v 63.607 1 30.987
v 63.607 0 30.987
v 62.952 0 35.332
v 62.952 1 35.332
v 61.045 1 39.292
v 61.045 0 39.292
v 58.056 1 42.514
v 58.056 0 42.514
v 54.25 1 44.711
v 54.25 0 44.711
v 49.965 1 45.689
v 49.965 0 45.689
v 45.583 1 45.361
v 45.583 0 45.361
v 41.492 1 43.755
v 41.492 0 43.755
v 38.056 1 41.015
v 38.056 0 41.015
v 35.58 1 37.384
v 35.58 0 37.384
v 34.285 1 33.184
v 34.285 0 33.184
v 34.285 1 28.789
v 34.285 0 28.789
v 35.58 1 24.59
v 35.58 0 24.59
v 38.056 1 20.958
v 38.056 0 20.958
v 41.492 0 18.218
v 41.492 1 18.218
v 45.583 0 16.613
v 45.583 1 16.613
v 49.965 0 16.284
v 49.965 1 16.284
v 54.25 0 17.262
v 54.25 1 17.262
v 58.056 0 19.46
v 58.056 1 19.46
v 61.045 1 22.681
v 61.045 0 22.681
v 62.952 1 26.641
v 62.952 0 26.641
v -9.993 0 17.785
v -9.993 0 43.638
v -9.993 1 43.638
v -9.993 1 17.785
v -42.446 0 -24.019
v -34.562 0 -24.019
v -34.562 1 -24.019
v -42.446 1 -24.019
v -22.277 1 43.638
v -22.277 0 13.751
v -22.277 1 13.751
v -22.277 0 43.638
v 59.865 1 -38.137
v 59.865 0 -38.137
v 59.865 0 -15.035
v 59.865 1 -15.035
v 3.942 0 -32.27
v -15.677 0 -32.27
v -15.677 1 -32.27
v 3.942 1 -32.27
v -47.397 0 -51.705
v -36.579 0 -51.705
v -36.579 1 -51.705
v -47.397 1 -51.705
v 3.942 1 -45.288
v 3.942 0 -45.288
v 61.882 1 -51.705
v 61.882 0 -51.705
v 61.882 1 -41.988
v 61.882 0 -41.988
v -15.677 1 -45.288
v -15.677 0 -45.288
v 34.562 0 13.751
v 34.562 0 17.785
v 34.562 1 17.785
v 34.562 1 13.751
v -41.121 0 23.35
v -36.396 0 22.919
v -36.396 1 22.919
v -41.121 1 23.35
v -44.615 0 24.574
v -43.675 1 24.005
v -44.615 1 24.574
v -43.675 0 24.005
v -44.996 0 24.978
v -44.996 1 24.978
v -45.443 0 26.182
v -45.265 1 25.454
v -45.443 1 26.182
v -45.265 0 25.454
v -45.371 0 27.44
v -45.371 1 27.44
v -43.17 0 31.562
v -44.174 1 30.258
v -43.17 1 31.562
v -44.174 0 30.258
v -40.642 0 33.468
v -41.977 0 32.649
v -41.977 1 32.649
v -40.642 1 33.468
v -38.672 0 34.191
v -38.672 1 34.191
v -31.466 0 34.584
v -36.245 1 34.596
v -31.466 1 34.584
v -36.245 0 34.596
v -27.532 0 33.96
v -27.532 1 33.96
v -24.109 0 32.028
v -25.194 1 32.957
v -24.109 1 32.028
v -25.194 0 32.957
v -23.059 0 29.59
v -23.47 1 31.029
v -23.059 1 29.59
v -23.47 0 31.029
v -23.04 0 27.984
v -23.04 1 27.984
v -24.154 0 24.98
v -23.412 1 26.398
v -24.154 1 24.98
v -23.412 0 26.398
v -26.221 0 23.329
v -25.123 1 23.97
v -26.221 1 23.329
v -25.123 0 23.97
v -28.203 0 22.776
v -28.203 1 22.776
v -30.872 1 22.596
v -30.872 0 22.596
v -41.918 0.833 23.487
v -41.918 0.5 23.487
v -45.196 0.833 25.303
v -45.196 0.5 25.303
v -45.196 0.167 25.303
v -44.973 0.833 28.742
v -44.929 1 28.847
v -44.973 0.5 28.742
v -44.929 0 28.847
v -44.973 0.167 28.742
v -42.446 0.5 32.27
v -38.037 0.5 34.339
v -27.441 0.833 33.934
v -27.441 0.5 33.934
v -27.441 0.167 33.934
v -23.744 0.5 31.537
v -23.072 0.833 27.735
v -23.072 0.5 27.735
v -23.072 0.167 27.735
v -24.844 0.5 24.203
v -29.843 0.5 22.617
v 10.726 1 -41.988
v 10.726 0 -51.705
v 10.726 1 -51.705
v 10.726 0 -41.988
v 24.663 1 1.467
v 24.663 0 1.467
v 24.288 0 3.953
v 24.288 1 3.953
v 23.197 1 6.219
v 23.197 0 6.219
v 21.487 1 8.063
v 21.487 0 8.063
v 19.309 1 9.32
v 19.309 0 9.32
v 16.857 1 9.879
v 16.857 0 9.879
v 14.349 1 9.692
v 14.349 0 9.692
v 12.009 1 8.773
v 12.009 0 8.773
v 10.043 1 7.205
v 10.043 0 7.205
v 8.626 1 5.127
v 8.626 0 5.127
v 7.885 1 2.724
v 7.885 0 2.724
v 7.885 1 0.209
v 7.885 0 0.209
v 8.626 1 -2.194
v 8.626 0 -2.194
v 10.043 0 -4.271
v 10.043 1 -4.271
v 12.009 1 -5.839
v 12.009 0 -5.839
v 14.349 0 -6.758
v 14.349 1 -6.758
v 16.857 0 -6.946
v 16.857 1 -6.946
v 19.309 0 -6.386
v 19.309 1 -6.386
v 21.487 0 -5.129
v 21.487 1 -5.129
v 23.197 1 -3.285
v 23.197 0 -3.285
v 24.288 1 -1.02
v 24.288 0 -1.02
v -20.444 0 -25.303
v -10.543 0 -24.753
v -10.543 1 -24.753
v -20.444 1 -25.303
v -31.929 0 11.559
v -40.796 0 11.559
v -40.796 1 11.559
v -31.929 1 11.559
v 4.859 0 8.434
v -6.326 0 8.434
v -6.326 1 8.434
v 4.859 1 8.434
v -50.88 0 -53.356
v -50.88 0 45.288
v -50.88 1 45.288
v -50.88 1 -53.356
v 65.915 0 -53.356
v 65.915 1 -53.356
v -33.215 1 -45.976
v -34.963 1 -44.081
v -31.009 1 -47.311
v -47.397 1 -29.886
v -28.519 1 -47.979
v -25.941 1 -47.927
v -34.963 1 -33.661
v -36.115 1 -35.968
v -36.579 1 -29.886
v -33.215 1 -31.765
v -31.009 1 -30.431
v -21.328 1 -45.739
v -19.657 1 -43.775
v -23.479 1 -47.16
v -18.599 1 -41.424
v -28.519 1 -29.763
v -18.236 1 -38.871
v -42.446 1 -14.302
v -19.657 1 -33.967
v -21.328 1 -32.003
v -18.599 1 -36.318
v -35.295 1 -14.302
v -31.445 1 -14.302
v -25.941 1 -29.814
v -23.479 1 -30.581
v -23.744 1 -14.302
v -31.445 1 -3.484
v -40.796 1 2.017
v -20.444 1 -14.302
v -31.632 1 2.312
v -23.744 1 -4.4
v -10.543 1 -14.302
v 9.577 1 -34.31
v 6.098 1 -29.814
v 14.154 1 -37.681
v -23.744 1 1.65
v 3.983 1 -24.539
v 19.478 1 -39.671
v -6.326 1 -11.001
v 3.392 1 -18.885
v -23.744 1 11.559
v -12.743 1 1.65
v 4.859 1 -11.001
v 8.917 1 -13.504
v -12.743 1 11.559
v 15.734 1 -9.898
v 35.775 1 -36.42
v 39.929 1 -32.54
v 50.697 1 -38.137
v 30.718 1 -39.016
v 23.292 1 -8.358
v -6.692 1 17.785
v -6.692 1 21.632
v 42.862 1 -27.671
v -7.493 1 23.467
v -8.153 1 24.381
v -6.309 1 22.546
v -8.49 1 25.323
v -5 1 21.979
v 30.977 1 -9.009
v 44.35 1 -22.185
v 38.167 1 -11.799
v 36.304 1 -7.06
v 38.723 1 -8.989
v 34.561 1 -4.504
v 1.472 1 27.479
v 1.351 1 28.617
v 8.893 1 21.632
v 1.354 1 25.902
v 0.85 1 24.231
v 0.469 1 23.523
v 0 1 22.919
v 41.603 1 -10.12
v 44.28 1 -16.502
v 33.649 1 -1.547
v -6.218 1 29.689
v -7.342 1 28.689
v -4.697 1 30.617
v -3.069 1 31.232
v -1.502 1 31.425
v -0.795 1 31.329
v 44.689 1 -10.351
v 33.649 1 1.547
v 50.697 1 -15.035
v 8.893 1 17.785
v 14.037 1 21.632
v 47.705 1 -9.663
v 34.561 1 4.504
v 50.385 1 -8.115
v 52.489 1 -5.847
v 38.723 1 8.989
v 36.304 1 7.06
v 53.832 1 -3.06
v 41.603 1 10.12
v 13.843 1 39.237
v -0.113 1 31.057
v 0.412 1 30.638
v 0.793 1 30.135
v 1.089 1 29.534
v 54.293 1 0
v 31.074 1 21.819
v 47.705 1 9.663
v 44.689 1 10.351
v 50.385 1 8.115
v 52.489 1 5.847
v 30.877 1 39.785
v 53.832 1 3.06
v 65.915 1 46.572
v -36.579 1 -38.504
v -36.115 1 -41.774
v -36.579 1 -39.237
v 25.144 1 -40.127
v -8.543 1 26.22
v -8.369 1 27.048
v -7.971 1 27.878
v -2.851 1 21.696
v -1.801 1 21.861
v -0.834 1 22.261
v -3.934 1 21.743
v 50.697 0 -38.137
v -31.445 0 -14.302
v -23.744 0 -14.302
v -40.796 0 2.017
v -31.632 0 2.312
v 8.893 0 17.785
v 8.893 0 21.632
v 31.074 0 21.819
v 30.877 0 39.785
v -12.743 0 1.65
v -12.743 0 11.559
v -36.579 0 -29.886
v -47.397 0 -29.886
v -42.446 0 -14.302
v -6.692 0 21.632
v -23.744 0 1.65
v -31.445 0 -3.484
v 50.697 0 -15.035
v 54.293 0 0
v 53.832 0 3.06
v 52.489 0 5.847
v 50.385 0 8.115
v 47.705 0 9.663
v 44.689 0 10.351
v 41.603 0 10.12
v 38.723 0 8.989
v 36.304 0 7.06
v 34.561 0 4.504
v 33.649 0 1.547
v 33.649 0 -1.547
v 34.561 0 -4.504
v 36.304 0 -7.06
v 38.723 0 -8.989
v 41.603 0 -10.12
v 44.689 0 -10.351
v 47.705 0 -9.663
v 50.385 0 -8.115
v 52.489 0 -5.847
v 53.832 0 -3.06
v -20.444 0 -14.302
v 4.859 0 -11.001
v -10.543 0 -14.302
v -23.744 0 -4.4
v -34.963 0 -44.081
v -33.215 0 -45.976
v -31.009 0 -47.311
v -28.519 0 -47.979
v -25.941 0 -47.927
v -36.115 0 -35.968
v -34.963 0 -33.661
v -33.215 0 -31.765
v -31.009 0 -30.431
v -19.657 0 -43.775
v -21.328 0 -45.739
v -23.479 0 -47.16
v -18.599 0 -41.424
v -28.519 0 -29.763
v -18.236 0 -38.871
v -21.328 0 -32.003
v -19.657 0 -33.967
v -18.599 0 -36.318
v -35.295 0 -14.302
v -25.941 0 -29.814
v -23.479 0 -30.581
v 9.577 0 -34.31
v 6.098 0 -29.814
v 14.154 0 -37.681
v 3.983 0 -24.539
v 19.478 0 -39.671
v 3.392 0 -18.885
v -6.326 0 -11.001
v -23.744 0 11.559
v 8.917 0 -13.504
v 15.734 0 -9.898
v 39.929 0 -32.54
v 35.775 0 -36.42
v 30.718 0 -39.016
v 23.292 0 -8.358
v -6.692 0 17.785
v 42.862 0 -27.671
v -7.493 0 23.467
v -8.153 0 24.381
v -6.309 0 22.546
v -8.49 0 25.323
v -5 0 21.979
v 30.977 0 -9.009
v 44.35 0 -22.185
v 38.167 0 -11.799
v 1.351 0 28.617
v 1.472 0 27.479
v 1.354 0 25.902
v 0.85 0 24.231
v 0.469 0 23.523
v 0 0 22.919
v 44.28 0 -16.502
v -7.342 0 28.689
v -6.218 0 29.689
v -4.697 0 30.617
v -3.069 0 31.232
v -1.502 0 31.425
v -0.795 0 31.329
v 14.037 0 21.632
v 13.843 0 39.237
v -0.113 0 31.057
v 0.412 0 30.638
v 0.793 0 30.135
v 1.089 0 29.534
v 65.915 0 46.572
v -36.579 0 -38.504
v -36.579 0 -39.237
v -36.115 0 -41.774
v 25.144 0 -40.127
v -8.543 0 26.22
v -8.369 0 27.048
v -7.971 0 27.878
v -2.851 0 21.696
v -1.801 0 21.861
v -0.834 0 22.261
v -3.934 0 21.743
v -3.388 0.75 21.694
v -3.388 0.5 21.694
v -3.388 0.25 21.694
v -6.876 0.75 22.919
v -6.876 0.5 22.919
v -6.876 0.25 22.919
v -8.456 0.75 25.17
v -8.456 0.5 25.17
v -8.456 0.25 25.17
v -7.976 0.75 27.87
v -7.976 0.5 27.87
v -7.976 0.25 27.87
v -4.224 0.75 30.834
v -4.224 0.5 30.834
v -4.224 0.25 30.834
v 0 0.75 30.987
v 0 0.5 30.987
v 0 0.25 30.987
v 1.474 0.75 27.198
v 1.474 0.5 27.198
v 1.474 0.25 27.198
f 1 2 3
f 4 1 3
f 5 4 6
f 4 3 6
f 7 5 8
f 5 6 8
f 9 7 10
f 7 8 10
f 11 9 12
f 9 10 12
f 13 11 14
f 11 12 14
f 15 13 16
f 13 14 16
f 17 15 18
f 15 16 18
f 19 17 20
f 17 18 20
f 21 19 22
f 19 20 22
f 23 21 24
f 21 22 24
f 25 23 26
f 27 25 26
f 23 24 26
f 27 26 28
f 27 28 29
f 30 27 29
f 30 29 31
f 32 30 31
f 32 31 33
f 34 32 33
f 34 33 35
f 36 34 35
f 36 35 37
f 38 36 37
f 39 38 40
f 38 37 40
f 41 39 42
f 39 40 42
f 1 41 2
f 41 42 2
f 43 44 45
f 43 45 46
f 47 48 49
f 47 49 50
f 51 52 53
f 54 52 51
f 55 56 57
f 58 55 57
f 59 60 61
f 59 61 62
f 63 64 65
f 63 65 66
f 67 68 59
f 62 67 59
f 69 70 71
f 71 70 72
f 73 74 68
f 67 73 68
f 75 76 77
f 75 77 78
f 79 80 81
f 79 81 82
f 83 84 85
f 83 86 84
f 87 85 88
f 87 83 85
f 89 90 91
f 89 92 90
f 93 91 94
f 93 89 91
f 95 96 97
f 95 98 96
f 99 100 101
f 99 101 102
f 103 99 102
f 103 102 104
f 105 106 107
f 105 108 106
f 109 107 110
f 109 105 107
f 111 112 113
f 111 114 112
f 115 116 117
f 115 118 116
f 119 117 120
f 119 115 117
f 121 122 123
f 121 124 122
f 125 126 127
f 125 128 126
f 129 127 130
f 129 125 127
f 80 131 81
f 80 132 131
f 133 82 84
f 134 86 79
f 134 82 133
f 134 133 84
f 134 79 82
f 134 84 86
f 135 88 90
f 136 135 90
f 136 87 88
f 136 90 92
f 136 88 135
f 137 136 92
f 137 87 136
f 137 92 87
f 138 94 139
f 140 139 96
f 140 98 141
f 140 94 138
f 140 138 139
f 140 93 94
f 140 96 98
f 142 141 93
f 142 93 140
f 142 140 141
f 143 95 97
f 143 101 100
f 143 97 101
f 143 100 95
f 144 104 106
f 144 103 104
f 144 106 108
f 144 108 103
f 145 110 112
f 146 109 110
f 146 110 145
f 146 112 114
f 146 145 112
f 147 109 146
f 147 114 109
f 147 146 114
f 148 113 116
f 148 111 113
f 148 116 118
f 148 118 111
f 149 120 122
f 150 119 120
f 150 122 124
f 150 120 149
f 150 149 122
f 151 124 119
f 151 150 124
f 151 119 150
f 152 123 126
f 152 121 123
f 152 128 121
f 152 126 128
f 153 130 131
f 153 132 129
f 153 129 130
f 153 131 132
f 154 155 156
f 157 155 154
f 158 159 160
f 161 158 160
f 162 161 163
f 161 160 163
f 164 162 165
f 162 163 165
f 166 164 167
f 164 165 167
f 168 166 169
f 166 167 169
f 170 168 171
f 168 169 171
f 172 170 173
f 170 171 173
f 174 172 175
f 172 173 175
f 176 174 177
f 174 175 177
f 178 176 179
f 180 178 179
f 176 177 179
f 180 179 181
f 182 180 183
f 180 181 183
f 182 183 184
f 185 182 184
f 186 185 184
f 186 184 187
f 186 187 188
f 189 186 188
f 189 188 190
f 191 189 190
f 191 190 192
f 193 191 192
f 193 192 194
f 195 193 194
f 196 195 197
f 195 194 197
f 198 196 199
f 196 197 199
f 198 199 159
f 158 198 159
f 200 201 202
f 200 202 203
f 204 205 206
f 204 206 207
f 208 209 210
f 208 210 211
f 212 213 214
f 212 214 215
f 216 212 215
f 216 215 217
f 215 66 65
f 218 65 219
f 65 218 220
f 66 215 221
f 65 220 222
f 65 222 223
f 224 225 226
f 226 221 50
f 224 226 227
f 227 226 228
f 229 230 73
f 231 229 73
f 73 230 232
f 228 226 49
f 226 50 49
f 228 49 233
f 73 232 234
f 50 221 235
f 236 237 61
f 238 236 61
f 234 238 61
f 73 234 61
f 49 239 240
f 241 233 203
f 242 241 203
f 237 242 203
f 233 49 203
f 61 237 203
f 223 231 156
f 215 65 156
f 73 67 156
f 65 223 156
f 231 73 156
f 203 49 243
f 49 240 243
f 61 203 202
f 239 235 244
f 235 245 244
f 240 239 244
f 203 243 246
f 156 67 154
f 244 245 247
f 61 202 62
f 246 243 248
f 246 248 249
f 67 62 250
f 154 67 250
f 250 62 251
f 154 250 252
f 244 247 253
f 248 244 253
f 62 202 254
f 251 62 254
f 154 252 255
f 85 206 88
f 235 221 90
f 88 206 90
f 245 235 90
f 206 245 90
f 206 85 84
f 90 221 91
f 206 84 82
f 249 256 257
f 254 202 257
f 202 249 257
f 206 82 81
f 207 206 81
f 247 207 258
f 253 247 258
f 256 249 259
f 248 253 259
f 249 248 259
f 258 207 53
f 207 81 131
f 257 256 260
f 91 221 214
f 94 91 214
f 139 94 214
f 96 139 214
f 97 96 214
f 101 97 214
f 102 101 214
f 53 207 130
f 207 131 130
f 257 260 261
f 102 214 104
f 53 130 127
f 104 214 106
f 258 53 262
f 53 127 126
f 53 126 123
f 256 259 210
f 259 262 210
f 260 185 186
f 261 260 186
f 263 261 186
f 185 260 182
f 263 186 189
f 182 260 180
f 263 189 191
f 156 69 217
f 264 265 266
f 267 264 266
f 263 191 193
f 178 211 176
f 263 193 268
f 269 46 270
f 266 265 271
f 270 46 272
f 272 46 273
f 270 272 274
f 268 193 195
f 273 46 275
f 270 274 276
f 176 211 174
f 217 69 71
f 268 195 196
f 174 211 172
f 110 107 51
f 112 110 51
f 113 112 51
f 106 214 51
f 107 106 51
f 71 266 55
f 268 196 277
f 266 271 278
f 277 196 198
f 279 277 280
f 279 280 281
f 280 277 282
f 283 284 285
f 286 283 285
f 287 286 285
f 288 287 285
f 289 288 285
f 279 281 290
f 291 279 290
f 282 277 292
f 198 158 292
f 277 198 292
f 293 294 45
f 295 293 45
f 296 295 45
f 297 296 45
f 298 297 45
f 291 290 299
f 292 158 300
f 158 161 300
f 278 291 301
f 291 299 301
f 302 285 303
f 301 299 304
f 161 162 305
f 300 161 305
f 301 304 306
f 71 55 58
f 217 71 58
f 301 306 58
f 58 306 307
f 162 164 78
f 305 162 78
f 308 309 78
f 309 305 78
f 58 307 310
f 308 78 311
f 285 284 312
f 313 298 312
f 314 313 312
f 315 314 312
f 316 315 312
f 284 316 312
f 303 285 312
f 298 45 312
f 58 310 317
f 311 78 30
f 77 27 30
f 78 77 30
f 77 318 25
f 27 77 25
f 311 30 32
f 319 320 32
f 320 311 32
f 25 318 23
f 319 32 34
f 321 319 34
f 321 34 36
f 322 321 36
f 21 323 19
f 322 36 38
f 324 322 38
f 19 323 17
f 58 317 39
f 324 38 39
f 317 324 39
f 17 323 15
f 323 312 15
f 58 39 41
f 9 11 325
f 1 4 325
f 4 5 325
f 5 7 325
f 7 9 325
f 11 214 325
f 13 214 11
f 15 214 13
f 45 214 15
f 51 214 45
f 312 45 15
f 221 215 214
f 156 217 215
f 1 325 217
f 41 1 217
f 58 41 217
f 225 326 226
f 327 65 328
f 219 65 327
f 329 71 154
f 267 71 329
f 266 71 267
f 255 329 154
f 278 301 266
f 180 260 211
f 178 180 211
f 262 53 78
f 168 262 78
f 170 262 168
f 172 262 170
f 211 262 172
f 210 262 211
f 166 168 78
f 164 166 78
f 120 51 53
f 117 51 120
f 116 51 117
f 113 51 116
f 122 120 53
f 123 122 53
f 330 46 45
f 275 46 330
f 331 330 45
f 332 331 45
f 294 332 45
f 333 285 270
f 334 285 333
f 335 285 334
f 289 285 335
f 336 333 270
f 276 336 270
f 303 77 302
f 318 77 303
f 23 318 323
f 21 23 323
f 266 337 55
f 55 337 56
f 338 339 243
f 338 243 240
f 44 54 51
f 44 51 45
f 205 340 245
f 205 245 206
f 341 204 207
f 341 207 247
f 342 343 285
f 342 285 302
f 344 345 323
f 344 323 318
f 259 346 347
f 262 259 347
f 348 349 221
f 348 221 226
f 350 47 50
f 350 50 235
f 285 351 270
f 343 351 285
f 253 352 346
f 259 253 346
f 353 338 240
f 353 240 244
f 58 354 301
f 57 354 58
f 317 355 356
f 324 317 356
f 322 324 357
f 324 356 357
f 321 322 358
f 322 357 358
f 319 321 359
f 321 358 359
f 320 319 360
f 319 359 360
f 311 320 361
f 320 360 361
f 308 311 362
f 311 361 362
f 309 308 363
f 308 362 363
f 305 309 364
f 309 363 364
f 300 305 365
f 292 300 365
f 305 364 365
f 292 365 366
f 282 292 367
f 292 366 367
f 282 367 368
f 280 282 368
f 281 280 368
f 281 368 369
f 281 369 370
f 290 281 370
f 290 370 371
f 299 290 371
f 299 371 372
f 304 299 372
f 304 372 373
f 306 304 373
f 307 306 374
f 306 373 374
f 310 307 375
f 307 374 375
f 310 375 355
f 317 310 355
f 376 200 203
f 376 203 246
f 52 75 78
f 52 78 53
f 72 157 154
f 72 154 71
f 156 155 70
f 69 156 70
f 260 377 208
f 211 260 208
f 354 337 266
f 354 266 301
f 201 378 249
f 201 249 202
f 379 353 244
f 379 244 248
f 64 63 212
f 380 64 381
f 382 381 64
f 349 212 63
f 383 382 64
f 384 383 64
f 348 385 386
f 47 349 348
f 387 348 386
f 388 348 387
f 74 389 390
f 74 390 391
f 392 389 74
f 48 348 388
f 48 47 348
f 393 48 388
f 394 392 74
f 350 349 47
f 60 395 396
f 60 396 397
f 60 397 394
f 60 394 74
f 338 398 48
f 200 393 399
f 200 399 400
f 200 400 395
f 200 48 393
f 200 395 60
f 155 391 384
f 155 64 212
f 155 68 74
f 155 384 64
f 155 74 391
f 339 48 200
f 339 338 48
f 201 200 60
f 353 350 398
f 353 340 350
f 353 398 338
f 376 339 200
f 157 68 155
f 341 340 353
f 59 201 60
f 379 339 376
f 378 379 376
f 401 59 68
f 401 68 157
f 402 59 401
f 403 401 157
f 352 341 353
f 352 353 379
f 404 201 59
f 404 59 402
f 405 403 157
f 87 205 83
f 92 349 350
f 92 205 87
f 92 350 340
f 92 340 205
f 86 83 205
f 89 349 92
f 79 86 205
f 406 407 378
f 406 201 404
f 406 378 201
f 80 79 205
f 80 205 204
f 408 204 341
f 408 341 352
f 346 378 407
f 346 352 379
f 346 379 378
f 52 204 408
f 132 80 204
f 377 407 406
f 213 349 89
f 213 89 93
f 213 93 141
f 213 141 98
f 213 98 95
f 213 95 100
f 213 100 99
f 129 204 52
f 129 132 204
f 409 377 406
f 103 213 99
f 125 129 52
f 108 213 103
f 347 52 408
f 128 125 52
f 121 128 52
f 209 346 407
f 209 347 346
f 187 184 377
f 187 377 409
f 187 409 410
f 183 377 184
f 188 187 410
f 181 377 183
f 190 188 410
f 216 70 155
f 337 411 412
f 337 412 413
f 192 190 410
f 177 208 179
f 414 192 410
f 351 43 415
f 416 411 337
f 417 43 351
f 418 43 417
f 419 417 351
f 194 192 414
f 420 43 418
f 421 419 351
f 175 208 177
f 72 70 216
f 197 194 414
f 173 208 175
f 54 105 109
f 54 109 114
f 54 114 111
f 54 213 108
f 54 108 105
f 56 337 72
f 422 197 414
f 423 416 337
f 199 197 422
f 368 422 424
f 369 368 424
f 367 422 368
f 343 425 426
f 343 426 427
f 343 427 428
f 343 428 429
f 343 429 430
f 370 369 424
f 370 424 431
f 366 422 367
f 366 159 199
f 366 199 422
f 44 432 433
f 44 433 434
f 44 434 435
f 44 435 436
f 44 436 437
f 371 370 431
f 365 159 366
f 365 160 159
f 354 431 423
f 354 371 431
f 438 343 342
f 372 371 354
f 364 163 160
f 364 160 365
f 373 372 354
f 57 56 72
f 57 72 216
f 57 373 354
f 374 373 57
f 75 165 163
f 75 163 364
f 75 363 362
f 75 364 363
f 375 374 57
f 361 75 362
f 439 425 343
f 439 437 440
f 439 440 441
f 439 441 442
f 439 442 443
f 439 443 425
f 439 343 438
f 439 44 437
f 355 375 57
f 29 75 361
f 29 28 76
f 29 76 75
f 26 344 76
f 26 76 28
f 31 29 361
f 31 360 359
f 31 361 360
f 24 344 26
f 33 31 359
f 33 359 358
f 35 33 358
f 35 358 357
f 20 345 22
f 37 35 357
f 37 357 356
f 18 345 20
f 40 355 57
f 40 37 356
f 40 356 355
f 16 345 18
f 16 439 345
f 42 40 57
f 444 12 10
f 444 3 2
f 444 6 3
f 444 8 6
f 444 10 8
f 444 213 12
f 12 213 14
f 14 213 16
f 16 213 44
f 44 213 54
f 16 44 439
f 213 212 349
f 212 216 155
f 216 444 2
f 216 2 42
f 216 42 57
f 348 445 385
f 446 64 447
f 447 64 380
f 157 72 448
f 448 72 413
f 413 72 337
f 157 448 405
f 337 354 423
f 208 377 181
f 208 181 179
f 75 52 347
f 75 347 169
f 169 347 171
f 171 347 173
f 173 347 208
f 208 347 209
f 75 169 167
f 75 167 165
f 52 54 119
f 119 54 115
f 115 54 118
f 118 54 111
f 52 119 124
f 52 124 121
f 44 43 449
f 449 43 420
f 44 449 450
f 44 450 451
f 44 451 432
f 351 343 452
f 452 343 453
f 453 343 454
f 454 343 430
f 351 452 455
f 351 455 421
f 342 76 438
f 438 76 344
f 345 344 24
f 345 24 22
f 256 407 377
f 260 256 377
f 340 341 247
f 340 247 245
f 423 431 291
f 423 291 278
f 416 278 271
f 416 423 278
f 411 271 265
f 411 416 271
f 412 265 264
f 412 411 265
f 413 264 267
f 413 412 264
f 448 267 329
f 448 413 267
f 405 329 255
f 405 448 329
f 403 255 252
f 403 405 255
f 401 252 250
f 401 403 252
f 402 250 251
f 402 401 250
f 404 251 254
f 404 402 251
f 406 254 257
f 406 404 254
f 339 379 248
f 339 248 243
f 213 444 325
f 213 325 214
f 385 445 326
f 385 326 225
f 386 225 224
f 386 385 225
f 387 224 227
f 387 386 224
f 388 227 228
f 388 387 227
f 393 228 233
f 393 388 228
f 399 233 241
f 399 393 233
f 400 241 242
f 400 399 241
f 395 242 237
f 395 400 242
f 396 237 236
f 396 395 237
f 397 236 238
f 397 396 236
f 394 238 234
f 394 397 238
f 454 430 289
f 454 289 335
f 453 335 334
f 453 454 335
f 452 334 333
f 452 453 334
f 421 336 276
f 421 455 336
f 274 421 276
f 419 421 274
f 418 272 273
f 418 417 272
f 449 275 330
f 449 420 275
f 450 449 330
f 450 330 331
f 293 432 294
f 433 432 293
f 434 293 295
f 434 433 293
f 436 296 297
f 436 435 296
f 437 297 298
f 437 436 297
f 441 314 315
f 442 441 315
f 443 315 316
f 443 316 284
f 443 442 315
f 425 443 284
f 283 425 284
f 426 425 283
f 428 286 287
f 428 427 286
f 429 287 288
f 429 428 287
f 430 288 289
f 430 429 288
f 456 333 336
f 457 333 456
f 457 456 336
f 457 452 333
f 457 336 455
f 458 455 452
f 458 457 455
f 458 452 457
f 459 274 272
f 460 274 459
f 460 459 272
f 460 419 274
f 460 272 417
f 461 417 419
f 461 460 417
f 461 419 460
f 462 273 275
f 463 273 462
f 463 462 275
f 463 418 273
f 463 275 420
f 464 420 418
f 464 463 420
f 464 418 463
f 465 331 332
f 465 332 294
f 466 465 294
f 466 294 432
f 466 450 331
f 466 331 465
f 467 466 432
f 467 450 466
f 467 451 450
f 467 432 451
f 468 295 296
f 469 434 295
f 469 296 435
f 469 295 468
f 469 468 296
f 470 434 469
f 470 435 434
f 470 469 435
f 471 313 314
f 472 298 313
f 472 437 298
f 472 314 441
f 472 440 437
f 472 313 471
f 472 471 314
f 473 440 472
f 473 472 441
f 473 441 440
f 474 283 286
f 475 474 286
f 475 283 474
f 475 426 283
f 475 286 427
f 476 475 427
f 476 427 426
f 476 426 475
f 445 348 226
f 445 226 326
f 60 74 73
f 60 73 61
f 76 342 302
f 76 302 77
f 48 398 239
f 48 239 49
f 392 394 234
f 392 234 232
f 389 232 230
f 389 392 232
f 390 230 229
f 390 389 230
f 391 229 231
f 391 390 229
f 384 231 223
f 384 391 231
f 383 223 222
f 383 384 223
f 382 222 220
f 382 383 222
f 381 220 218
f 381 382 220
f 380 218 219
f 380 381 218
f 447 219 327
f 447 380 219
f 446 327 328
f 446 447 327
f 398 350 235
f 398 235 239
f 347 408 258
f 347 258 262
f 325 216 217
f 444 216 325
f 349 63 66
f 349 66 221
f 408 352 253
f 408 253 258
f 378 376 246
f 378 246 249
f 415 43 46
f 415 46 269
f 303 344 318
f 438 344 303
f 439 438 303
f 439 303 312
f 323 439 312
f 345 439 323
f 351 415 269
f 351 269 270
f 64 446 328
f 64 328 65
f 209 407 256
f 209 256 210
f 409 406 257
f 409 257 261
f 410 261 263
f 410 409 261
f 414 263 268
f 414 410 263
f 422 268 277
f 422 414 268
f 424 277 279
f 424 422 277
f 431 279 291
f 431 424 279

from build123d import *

# Parameters (mm, degrees)
F0_W     = 19.6187430993
F0_H     = 13.0180455744
F0_W_2   = 51.1554153636
F0_H_2   = 9.717695415
F0_W_3   = 9.1676339507
F0_H_3   = 23.1024445966
F0_W_4   = 11.0011650249
F0_H_4   = 9.9090581928
F0_W_5   = 11.1845177598
F0_H_5   = 19.4353917614
F0_R     = 8.4362194628
F0_R_2   = 10.3800985227
F0_R_3   = 14.7436590879
F1_DEPTH = 1


with BuildPart() as f1:
    # F0 (on Front) → F1 (new body)
    with BuildSketch(Plane.XZ):
        Polygon((65.9153088927, 46.5715937316), (-50.8803874254, 45.2881269157), (-50.8803874254, -53.3556491137), (65.9153088927, -53.3556491137), align=None)
        with BuildLine():
            ThreePointArc((-36.5788713098, -38.504075259), (-27.227845658, -29.6976476178), (-18.236268467, -38.8707816601))
            ThreePointArc((-18.236268467, -38.8707816601), (-27.227845658, -48.0439157024), (-36.5788713098, -39.2374880612))
            Line((-36.5788713098, -39.2374880612), (-36.5788713098, -51.7054721713))
            Line((-36.5788713098, -51.7054721713), (-47.3966822028, -51.7054721713))
            Line((-47.3966822028, -51.7054721713), (-47.3966822028, -29.8864971846))
            Line((-47.3966822028, -29.8864971846), (-36.5788713098, -29.8864971846))
            Line((-36.5788713098, -29.8864971846), (-36.5788713098, -38.504075259))
        make_face(mode=Mode.SUBTRACT)
        with Locations((-5.8672870509, -38.7791041285)):
            Rectangle(F0_W, F0_H, mode=Mode.SUBTRACT)
        Polygon((-42.4461588264, -14.3015133217), (-35.2954007685, -14.3015133217), (-34.5619916916, -24.019209668), (-42.4461588264, -24.019209668), align=None, mode=Mode.SUBTRACT)
        Polygon((-31.4449965954, -14.3015133217), (-31.4449965954, -3.4837021958), (-23.7441807985, -4.4004661031), (-23.7441807985, -14.3015133217), align=None, mode=Mode.SUBTRACT)
        Polygon((-10.5427829549, -24.7526206076), (-20.4438306391, -25.3026783466), (-20.4438306391, -14.3015133217), (-10.5427829549, -14.3015133217), align=None, mode=Mode.SUBTRACT)
        with Locations((36.3038419746, -46.8466244638)):
            Rectangle(F0_W_2, F0_H_2, mode=Mode.SUBTRACT)
        with BuildLine():
            ThreePointArc((44.2796908319, -16.5017470717), (25.1436526849, -40.1272688946), (3.3920246642, -18.8853312284))
            ThreePointArc((3.3920246642, -18.8853312284), (23.29160868, -8.3575674607), (44.2796908319, -16.5017470717))
        make_face(mode=Mode.SUBTRACT)
        with Locations((55.2808530629, -26.5861465596)):
            Rectangle(F0_W_3, F0_H_3, mode=Mode.SUBTRACT)
        Polygon((-40.7959856093, 2.0168800838), (-40.7959856093, 10.4511063546), (-40.7959856093, 11.5592328068), (-31.9293554408, 11.5592328068), (-31.6319303269, 2.3116177173), align=None, mode=Mode.SUBTRACT)
        with Locations((-18.2435982861, 6.6047037104)):
            Rectangle(F0_W_4, F0_H_4, mode=Mode.SUBTRACT)
        with Locations((-0.7334102411, -1.2834691443)):
            Rectangle(F0_W_5, F0_H_5, mode=Mode.SUBTRACT)
        with BuildLine():
            add(Edge.make_bspline(
                [(-36.3955199718, 22.91909419), (-40.3692436742, 23.2173613235), (-47.6988040414, 23.4513357592), (-42.9374028879, 34.1746216584), (-33.0552959902, 35.1245405062), (-21.8470292719, 33.3889159272), (-23.5433606261, 21.574130731), (-31.9091596533, 22.5823486253), (-36.3955199718, 22.91909419)],
                knots=[0, 0, 0, 0, 0.1664989371, 0.3174094582, 0.4918255897, 0.6618626164, 0.8120215998, 1, 1, 1, 1], degree=3))
        make_face(mode=Mode.SUBTRACT)
        with BuildLine():
            add(Edge.make_bspline(
                [(0, 22.91909419), (-1.7493788556, 21.0647309914), (-7.778921877, 21.8877975552), (-9.9017590218, 28.5620022365), (2.1822872024, 34.478092849), (1.8949358834, 24.9277496363), (0, 22.91909419)],
                knots=[0, 0, 0, 0, 0.24642613, 0.4580606264, 0.7330699895, 1, 1, 1, 1], degree=3))
        make_face(mode=Mode.SUBTRACT)
        Polygon((-22.2773589194, 13.7514555827), (-22.2773589194, 17.7852157503), (-22.2773589194, 43.6379536986), (-9.9927242845, 43.6379536986), (-9.9927242845, 17.7852157503), (-6.6923755221, 17.7852157503), (-6.6923755221, 21.6317051071), (8.8926088065, 21.6317051071), (8.8926088065, 17.7852157503), (34.5619954169, 17.7852157503), (34.5619954169, 13.7514555827), align=None, mode=Mode.SUBTRACT)
        with Locations((16.2267182022, 1.4668219956)):
            Circle(F0_R, mode=Mode.SUBTRACT)
        with Locations((43.9129844308, 0)):
            Circle(F0_R_2, mode=Mode.SUBTRACT)
        Polygon((14.0366028987, 21.6317051071), (13.8431331143, 39.2374880612), (30.8768302154, 39.7853319379), (31.0742628188, 21.8189317928), align=None, mode=Mode.SUBTRACT)
        with Locations((48.8635078073, 30.9866126627)):
            Circle(F0_R_3, mode=Mode.SUBTRACT)
    extrude(amount=-F1_DEPTH)


solid = f1.part
